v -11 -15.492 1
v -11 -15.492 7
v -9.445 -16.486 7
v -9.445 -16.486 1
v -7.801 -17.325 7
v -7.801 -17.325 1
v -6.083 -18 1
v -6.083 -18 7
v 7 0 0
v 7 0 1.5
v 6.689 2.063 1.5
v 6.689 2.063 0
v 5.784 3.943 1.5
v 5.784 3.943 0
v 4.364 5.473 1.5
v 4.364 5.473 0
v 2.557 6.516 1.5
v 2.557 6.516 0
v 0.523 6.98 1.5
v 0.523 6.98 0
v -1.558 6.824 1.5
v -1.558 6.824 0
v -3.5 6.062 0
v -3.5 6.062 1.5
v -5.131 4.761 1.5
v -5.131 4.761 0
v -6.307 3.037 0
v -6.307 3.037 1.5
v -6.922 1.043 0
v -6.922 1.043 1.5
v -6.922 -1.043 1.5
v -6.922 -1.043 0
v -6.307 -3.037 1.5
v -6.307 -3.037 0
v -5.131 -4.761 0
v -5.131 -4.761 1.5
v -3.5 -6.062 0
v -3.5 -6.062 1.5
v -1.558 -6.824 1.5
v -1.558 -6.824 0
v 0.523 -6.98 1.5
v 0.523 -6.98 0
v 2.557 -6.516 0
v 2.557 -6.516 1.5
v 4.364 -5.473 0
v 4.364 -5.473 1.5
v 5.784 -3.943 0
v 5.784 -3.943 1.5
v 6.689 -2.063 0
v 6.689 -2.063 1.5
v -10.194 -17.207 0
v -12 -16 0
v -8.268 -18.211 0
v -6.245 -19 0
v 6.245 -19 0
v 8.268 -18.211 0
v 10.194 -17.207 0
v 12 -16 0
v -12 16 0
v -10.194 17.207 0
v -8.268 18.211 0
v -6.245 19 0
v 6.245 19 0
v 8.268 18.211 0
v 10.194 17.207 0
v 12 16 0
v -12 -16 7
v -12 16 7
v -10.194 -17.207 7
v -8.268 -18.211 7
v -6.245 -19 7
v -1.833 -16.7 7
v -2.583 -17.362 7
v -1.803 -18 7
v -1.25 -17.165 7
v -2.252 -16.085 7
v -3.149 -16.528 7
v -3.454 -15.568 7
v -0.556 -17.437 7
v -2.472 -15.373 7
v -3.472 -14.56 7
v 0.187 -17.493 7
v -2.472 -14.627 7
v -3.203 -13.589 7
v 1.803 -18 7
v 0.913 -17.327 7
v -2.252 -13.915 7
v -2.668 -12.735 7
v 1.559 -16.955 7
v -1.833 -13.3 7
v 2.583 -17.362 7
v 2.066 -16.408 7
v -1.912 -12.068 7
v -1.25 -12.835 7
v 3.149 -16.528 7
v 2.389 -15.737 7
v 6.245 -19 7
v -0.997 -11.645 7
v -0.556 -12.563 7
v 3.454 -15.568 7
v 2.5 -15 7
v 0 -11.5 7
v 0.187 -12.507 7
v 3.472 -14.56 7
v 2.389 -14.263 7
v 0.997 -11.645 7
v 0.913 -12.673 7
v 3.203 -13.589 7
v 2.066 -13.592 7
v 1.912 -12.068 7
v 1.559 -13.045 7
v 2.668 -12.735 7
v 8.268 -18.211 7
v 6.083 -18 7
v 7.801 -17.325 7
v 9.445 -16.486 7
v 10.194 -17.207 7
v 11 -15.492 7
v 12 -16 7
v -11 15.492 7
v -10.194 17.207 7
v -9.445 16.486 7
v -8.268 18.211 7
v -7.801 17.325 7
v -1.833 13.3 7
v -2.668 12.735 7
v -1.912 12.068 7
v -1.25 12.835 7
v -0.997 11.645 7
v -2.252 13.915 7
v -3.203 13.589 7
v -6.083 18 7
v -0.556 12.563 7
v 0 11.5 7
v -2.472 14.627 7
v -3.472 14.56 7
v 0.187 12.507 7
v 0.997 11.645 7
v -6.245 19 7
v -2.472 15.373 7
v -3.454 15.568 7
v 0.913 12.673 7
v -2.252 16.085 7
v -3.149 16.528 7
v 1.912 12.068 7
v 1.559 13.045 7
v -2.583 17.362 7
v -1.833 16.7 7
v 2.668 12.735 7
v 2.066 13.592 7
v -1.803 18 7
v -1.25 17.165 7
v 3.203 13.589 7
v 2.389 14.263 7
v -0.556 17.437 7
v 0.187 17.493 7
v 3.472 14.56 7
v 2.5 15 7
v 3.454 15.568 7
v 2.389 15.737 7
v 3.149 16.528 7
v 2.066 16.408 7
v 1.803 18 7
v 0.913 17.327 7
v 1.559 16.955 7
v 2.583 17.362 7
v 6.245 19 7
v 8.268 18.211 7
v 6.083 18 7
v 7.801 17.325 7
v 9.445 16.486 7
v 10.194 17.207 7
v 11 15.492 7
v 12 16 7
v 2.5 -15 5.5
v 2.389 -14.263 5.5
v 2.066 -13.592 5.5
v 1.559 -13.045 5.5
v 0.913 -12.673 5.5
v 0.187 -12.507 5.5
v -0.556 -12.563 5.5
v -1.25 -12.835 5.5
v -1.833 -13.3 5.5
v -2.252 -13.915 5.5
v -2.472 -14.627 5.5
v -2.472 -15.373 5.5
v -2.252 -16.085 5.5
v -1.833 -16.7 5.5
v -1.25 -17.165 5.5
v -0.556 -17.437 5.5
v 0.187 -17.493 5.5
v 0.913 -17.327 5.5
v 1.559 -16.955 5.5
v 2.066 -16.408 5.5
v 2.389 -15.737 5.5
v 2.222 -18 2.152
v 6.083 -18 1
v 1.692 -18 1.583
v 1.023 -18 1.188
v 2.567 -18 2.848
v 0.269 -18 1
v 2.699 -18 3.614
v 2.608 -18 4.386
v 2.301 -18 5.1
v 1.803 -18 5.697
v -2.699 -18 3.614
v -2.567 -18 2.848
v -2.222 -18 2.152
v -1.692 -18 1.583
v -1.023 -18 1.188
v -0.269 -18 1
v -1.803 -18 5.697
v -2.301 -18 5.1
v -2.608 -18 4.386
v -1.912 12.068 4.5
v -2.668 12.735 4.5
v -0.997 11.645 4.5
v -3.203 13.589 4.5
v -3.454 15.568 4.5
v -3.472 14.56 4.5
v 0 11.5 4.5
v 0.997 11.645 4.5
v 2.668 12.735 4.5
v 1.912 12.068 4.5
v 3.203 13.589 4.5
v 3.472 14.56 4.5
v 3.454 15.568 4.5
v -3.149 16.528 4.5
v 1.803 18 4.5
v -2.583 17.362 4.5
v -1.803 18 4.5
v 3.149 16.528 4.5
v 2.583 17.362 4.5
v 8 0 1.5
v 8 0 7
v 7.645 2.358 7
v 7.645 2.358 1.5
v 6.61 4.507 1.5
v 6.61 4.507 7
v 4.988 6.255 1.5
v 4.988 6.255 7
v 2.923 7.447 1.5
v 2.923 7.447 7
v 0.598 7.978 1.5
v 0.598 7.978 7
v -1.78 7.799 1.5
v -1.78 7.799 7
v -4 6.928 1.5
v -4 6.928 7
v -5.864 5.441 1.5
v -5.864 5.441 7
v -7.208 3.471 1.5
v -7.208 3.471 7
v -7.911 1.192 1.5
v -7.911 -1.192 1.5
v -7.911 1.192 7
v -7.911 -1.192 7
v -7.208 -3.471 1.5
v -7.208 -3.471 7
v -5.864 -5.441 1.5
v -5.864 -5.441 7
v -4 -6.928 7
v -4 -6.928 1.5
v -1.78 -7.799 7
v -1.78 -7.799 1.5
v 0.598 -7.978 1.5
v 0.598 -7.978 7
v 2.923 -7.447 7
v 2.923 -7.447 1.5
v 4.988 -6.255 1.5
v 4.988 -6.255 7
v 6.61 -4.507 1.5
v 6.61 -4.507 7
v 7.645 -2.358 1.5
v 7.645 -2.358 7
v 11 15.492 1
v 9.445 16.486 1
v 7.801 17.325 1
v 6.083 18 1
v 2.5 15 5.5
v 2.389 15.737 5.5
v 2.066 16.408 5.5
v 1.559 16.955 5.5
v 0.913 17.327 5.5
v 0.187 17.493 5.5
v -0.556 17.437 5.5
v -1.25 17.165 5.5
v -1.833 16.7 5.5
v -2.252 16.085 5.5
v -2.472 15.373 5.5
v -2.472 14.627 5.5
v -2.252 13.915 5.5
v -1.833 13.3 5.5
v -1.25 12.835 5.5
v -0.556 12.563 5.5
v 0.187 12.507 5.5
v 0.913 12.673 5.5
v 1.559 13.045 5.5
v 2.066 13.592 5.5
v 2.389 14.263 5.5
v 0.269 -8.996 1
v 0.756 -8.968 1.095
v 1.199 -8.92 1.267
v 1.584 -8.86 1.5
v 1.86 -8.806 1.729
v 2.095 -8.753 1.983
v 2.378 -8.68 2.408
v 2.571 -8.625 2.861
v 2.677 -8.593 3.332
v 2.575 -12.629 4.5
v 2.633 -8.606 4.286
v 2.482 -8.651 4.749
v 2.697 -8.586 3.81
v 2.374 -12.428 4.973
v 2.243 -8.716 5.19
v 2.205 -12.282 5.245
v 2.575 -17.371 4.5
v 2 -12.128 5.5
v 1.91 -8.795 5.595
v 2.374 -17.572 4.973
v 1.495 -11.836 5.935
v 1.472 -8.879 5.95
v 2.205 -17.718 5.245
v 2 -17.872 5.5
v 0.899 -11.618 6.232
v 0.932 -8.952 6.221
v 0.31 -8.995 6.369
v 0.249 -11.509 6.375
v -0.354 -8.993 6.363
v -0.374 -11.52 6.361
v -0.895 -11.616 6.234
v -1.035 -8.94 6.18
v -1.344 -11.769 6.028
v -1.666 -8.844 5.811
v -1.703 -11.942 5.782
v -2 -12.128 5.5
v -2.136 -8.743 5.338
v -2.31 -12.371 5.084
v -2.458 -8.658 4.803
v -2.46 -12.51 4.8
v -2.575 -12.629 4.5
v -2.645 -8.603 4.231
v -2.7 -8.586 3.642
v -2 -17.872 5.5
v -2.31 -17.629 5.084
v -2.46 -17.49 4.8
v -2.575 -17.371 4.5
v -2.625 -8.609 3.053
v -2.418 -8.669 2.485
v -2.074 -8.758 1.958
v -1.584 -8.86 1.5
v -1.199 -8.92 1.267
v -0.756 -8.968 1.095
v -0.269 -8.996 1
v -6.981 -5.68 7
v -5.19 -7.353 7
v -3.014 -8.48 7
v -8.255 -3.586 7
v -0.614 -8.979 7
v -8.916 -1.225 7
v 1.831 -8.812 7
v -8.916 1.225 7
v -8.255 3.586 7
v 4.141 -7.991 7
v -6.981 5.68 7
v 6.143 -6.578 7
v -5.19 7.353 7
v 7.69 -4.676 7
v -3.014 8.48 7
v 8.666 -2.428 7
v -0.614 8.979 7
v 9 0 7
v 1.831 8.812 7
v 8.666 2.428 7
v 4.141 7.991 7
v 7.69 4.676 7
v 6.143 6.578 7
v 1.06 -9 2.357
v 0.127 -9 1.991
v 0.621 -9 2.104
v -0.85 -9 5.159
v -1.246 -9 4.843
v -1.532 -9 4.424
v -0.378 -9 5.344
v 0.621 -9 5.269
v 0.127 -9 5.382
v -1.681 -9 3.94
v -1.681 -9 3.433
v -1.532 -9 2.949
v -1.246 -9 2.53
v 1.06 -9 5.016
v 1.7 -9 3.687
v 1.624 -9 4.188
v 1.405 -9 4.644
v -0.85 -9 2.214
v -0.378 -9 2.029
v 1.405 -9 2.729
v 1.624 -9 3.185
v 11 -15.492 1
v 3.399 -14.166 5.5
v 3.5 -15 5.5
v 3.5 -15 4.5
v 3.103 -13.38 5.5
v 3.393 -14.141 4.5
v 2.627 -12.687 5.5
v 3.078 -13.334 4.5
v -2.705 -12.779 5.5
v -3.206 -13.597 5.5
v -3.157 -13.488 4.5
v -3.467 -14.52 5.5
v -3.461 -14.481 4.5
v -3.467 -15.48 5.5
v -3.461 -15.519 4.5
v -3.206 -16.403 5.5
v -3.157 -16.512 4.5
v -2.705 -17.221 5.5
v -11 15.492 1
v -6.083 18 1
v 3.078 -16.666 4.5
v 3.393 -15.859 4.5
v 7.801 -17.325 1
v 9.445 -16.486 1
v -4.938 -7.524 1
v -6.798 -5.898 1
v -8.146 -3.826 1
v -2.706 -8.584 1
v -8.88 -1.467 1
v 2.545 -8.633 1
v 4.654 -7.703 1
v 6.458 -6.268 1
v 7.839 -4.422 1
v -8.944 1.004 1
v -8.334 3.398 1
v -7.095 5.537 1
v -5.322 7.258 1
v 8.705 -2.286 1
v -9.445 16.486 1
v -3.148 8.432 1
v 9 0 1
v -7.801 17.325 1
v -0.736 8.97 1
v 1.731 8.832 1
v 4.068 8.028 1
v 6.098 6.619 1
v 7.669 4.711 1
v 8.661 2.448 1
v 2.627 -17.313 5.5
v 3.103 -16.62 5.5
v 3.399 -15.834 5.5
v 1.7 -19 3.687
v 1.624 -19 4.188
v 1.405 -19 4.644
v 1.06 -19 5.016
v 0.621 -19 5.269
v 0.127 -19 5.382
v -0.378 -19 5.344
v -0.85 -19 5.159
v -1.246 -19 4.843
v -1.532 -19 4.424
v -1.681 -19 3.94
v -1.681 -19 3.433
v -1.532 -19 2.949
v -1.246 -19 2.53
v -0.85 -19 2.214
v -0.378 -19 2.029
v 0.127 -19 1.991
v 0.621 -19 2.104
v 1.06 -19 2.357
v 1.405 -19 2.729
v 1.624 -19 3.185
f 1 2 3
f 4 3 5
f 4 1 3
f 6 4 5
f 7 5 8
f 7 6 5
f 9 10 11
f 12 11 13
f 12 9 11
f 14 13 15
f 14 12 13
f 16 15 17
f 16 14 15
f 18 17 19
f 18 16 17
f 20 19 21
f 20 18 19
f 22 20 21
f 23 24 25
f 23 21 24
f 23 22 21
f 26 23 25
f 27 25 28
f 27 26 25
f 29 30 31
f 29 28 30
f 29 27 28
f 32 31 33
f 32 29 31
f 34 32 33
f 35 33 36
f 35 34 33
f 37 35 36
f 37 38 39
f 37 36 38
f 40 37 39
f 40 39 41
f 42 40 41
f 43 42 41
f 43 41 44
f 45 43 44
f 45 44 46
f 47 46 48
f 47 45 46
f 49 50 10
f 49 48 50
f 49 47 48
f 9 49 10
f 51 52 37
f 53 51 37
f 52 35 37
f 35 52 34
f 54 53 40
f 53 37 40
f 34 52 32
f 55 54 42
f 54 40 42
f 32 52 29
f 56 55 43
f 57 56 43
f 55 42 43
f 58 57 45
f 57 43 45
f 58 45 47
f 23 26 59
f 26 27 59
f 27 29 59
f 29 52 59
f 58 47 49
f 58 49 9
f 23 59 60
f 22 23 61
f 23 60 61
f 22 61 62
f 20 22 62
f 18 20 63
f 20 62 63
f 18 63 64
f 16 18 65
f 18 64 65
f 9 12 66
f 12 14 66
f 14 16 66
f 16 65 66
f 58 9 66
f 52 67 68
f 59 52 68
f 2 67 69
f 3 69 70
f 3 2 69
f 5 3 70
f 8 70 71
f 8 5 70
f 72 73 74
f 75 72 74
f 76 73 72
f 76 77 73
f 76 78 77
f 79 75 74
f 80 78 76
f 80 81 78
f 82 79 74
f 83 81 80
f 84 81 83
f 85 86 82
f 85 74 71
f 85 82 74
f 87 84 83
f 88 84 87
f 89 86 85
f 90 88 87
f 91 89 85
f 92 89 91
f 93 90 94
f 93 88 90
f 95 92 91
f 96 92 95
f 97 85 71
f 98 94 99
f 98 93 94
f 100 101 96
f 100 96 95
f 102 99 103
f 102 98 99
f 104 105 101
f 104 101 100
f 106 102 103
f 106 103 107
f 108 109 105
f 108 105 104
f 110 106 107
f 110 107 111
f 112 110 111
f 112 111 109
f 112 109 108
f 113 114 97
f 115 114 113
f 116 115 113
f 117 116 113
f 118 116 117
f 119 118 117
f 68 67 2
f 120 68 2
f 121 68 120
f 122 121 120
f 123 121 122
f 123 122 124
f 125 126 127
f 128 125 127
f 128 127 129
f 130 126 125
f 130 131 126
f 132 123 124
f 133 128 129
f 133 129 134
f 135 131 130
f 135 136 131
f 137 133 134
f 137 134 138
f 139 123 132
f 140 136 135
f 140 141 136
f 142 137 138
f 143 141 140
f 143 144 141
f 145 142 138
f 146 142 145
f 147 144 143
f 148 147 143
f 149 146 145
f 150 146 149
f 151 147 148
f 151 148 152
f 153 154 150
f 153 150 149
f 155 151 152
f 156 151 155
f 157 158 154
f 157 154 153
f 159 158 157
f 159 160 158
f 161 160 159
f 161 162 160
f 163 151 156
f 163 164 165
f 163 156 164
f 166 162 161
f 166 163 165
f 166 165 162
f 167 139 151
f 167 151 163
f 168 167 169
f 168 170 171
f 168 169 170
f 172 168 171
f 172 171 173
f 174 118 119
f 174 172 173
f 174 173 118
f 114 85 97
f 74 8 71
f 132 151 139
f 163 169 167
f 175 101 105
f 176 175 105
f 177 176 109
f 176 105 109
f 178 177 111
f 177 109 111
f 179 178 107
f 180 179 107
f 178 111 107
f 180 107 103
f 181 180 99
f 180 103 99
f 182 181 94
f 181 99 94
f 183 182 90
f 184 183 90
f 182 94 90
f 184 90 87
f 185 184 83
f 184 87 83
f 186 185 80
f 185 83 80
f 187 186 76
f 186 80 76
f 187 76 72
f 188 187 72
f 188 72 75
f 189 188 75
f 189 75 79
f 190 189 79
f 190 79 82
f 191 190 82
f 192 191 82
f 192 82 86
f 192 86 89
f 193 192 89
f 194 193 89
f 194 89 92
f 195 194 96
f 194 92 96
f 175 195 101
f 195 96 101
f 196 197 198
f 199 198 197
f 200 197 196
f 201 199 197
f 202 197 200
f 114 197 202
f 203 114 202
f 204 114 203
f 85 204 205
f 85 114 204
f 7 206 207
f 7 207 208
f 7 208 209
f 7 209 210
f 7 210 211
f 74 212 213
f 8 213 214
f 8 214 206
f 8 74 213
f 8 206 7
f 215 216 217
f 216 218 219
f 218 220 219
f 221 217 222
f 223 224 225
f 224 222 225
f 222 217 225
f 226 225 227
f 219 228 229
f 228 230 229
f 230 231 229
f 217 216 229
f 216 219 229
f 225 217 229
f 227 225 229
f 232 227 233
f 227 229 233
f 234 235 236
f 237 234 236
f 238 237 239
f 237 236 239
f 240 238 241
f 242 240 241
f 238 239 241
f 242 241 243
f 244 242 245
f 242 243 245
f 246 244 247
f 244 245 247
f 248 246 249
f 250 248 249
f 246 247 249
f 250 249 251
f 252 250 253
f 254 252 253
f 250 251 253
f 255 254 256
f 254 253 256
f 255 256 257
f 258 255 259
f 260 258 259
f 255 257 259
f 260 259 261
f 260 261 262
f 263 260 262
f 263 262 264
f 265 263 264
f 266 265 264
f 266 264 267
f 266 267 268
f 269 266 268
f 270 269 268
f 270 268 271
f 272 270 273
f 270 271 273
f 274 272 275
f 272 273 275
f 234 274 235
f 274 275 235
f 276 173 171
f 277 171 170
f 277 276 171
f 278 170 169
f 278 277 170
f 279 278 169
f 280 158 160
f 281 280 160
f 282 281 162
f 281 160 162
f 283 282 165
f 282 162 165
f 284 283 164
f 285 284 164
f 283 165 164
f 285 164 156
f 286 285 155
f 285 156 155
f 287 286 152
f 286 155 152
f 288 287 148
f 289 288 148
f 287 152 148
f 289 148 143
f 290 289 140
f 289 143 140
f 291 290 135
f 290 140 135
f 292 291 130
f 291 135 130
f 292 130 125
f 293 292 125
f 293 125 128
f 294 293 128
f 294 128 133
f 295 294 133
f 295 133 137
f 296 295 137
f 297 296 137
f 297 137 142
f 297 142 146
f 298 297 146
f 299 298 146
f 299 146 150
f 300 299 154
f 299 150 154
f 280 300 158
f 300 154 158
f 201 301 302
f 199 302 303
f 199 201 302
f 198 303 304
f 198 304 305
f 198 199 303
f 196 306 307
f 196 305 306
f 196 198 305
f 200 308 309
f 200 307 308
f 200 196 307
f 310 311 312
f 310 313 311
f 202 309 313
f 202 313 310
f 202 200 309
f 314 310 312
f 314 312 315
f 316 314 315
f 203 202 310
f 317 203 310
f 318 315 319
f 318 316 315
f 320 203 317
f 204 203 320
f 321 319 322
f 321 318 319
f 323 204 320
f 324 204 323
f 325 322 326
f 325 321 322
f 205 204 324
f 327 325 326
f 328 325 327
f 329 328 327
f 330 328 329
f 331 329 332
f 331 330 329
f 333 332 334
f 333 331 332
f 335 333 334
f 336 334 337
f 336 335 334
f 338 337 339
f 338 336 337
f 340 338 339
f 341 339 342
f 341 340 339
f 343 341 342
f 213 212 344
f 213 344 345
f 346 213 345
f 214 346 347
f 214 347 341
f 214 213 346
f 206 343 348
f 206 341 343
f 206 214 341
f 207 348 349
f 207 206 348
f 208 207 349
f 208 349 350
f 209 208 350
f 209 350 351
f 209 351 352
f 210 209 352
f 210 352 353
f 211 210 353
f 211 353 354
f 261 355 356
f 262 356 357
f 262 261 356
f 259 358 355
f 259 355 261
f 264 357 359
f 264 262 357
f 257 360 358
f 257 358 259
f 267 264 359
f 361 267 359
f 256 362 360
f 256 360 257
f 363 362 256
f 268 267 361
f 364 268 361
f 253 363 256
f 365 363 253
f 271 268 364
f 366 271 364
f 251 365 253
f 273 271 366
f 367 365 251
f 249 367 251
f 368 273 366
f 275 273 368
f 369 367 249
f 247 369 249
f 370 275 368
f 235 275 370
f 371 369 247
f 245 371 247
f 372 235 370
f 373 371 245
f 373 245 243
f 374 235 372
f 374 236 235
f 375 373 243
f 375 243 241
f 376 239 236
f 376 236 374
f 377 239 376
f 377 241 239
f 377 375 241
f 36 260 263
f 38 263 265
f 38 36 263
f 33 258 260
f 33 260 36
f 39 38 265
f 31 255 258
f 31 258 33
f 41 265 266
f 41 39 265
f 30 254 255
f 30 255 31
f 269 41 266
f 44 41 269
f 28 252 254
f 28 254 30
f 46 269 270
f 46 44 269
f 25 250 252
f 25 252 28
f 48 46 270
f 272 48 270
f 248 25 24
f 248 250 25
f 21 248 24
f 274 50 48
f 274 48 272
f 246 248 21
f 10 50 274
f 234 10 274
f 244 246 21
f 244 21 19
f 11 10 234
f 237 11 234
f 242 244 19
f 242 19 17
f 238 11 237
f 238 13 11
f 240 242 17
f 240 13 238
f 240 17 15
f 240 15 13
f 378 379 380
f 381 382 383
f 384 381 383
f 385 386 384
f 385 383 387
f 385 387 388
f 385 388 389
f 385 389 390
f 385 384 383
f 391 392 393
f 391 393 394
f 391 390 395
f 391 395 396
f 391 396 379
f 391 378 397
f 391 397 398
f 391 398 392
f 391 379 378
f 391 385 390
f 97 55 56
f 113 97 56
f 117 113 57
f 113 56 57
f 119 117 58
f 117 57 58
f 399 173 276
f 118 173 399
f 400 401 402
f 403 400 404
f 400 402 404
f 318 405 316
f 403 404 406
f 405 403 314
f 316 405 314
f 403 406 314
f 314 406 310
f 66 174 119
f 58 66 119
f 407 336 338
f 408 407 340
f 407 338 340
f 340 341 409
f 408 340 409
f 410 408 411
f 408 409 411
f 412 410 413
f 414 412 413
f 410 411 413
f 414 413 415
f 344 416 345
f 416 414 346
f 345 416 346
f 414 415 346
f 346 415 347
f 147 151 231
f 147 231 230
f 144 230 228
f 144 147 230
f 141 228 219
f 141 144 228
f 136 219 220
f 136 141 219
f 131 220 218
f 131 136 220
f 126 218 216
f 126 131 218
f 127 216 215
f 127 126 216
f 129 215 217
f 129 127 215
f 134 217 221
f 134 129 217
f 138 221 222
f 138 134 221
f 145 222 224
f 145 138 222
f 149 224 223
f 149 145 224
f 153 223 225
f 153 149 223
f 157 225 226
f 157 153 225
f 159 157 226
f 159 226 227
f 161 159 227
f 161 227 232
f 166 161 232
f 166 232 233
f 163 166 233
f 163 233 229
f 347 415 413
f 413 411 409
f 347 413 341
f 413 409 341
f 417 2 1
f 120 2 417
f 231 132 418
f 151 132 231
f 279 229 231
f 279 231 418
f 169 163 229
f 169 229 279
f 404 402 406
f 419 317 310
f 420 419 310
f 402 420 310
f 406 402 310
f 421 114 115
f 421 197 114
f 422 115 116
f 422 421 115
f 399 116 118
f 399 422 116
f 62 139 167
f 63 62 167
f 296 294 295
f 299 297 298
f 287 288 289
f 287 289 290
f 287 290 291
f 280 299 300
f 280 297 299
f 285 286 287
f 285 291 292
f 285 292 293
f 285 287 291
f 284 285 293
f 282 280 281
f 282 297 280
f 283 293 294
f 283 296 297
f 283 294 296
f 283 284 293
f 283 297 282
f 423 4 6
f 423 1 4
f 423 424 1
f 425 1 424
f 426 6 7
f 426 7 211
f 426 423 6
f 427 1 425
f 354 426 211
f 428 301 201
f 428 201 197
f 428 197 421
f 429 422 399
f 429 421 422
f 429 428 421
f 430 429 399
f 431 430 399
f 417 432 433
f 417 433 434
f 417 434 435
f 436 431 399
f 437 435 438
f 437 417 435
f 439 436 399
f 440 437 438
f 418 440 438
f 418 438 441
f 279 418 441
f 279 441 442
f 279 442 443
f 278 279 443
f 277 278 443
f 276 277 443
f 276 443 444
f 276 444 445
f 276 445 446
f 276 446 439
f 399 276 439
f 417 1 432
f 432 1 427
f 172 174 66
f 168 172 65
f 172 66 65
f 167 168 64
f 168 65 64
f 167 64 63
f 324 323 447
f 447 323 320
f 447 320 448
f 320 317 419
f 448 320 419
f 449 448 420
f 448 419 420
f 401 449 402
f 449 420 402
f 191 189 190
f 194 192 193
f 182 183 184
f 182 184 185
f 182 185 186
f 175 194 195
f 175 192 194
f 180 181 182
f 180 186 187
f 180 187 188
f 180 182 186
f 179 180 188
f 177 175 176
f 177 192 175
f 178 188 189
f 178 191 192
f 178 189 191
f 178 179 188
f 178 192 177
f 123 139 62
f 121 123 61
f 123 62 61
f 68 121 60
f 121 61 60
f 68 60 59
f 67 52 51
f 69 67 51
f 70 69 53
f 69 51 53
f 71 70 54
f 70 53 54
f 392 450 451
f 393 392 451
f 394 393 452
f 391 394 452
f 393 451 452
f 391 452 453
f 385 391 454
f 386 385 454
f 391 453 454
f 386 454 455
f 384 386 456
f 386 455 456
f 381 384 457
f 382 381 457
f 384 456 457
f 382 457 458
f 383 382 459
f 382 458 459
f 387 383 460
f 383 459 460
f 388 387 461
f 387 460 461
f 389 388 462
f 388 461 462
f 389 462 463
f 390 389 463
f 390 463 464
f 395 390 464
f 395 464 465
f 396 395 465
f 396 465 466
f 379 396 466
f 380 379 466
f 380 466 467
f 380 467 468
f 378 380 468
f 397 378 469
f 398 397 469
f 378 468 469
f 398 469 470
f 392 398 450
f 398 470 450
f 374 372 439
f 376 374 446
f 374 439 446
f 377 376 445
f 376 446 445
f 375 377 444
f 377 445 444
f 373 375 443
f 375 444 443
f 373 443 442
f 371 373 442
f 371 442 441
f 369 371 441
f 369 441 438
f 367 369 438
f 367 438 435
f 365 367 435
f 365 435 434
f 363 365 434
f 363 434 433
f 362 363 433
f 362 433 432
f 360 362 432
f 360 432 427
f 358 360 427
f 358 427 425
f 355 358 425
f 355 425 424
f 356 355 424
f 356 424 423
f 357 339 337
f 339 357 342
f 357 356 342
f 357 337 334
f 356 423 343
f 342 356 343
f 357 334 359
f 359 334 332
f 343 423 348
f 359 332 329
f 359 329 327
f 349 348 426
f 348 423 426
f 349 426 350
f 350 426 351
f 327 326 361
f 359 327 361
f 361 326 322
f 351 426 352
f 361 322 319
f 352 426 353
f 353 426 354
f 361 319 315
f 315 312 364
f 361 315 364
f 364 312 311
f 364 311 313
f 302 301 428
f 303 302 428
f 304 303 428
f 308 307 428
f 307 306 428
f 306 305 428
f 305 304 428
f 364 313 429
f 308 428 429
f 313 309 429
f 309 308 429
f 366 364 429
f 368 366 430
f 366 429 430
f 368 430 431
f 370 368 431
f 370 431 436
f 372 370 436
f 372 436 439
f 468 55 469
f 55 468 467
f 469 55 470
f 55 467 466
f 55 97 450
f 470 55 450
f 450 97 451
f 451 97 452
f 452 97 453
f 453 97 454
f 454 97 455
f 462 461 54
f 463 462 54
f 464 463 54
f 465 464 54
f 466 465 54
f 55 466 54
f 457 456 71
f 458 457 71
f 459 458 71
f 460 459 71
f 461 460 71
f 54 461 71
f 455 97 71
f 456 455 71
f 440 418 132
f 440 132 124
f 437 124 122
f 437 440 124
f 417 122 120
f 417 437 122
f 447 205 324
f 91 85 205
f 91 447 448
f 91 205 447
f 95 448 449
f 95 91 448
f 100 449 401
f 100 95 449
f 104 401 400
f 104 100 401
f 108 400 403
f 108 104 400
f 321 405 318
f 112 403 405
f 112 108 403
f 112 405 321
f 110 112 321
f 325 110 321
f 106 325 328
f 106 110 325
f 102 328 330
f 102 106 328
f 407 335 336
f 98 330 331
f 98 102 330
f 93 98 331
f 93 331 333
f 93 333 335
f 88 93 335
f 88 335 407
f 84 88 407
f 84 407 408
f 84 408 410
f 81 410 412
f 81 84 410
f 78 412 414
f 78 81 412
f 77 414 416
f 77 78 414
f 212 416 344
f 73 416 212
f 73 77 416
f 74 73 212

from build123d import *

# Parameters (mm, degrees)
F0_R     = 20
F0_R_2   = 7
F1_DEPTH = 7
F2_R     = 8
F3_DEPTH = 5.5
F4_R     = 2.5
F5_DEPTH = 1.5
F7_DEPTH = 25
F8_R     = 1.7
F9_DEPTH = 10
F10_T    = 1


# Not quite as in the source:
# - a shell that OpenCascade refuses in one call is made with other operations: the cavity is built on its own and cut out


with BuildPart() as f1:
    # F0 (on Top) → F1 (new body)
    with BuildSketch(Plane.XY):
        Circle(F0_R)
        Circle(F0_R_2, mode=Mode.SUBTRACT)
    extrude(amount=F1_DEPTH)

    # F2 (on face) → F3 (cut)
    with BuildSketch(Plane.XY.offset(7)):
        Circle(F2_R)
    extrude(amount=-F3_DEPTH, mode=Mode.SUBTRACT)

    # F4 (on face) → F5 (cut)
    with BuildSketch(Plane.XY.offset(7)):
        with Locations((0, 15)):
            Circle(F4_R)
        with Locations((0, -15)):
            Circle(F4_R)
    extrude(amount=-F5_DEPTH, mode=Mode.SUBTRACT)

    # F6 (on face) → F7 (cut)
    with BuildSketch(Plane.XY.offset(7)):
        with BuildLine():
            Line((-12, -16), (-12, 16))
            ThreePointArc((-12, 16), (-20, 0), (-12, -16))
        make_face()
        with BuildLine():
            Line((12, 16), (12, 19))
            Line((12, 19), (6.2449979984, 19))
            ThreePointArc((6.2449979984, 19), (9.2449979984, 17.7349939952), (12, 16))
        make_face()
        with BuildLine():
            ThreePointArc((-12, 16), (-9.2449979984, 17.7349939952), (-6.2449979984, 19))
            Line((-6.2449979984, 19), (-12, 19))
            Line((-12, 19), (-12, 16))
        make_face()
        with BuildLine():
            Line((12, -19), (12, -16))
            ThreePointArc((12, -16), (9.2449979984, -17.7349939952), (6.2449979984, -19))
            Line((6.2449979984, -19), (12, -19))
        make_face()
        with BuildLine():
            ThreePointArc((-6.2449979984, -19), (-9.2449979984, -17.7349939952), (-12, -16))
            Line((-12, -16), (-12, -19))
            Line((-12, -19), (-6.2449979984, -19))
        make_face()
        with BuildLine():
            ThreePointArc((20, 0), (17.88854382, 8.94427191), (12, 16))
            Line((12, 16), (12, -16))
            ThreePointArc((12, -16), (17.88854382, -8.94427191), (20, 0))
        make_face()
        with BuildLine():
            Line((-6.2449979984, 19), (6.2449979984, 19))
            ThreePointArc((6.2449979984, 19), (0, 20), (-6.2449979984, 19))
        make_face()
        with BuildLine():
            ThreePointArc((-6.2449979984, -19), (0, -20), (6.2449979984, -19))
            Line((6.2449979984, -19), (-6.2449979984, -19))
        make_face()
    extrude(amount=-F7_DEPTH, mode=Mode.SUBTRACT)

    # F8 (on face) → F9 (cut)
    with BuildSketch(Plane.XZ.offset(19)):
        with Locations((0, 3.6865652073)):
            Circle(F8_R)
    extrude(amount=-F9_DEPTH, mode=Mode.SUBTRACT)

    # F10: shell of thickness 1, made by hand


with BuildPart() as f10_core1:
    # F10_t2: copy of F1
    add(f1.part)

    # the walls: a layer under each face that stays
    f10_faces = [f10_core1.faces().sort_by_distance(p)[0] for p in [
        (9.2449979984, 17.7349939952, 3.5),
        (-8, -12.6666666667, 0),
        (0, 19, 3.5),
        (12, 0, 3.5),
        (9.2449979984, -17.7349939952, 3.5),
        (4.1633319989, -19, 1.1666666667),
        (-9.2449979984, -17.7349939952, 3.5),
        (-12, 0, 3.5),
        (-9.2449979984, 17.7349939952, 3.5),
        (-7, 0, 0.75),
        (-2.5, -15, 6.25),
        (-8, 0, 4.25),
        (-2.5, 15, 6.25),
        (-1.7, -14, 3.6865652073),
        (-5.3333333333, -5.3333333333, 1.5),
        (0, -15, 5.5),
        (0, 15, 5.5),
        (0, -9, 3.6865652073),
    ]]
    thicken(f10_faces, amount=-F10_T, mode=Mode.SUBTRACT)

    # F10_s3 → F10_t4 (revolve, cut)
    with BuildSketch(Plane.XZ.offset(15)):
        Polygon((2.49, 5.51), (3.5, 5.5), (3.5, 4.5), (2.5, 4.5), align=None)
    revolve(axis=Axis((0, -15, 5.5), (0, 0, 1)), mode=Mode.SUBTRACT)

    # F10_s5 → F10_t6 (revolve, cut)
    with BuildSketch(Plane.XZ):
        Polygon((7.99, 1.51), (9, 1.5), (9, 0.5), (8, 0.5), align=None)
    revolve(axis=Axis((0, 0, 1.5), (0, 0, 1)), mode=Mode.SUBTRACT)

    # F10_s7 → F10_t8 (revolve, cut)
    with BuildSketch(Plane.XZ.offset(-15)):
        Polygon((2.49, 5.51), (3.5, 5.5), (3.5, 4.5), (2.5, 4.5), align=None)
    revolve(axis=Axis((0, 15, 5.5), (0, 0, 1)), mode=Mode.SUBTRACT)

    # F10_s9 → F10_t10 (revolve, cut)
    with BuildSketch(Plane.XY.offset(3.6865652073)):
        Polygon((1.69, -9.01), (2.7, -9), (2.7, -8), (1.7, -8), align=None)
    revolve(axis=Axis((0, -9, 3.6865652073), (0, -1, 0)), mode=Mode.SUBTRACT)


with BuildPart() as f1_1:
    add(f1.part)

    # what is left inside the walls is the cavity
    f10_cavity = [f10_core1.part.solids().sort_by_distance(p)[0] for p in [
        (5.5, -14, 1.01),
    ]]
    add(f10_cavity, mode=Mode.SUBTRACT)


solid = f1_1.part
